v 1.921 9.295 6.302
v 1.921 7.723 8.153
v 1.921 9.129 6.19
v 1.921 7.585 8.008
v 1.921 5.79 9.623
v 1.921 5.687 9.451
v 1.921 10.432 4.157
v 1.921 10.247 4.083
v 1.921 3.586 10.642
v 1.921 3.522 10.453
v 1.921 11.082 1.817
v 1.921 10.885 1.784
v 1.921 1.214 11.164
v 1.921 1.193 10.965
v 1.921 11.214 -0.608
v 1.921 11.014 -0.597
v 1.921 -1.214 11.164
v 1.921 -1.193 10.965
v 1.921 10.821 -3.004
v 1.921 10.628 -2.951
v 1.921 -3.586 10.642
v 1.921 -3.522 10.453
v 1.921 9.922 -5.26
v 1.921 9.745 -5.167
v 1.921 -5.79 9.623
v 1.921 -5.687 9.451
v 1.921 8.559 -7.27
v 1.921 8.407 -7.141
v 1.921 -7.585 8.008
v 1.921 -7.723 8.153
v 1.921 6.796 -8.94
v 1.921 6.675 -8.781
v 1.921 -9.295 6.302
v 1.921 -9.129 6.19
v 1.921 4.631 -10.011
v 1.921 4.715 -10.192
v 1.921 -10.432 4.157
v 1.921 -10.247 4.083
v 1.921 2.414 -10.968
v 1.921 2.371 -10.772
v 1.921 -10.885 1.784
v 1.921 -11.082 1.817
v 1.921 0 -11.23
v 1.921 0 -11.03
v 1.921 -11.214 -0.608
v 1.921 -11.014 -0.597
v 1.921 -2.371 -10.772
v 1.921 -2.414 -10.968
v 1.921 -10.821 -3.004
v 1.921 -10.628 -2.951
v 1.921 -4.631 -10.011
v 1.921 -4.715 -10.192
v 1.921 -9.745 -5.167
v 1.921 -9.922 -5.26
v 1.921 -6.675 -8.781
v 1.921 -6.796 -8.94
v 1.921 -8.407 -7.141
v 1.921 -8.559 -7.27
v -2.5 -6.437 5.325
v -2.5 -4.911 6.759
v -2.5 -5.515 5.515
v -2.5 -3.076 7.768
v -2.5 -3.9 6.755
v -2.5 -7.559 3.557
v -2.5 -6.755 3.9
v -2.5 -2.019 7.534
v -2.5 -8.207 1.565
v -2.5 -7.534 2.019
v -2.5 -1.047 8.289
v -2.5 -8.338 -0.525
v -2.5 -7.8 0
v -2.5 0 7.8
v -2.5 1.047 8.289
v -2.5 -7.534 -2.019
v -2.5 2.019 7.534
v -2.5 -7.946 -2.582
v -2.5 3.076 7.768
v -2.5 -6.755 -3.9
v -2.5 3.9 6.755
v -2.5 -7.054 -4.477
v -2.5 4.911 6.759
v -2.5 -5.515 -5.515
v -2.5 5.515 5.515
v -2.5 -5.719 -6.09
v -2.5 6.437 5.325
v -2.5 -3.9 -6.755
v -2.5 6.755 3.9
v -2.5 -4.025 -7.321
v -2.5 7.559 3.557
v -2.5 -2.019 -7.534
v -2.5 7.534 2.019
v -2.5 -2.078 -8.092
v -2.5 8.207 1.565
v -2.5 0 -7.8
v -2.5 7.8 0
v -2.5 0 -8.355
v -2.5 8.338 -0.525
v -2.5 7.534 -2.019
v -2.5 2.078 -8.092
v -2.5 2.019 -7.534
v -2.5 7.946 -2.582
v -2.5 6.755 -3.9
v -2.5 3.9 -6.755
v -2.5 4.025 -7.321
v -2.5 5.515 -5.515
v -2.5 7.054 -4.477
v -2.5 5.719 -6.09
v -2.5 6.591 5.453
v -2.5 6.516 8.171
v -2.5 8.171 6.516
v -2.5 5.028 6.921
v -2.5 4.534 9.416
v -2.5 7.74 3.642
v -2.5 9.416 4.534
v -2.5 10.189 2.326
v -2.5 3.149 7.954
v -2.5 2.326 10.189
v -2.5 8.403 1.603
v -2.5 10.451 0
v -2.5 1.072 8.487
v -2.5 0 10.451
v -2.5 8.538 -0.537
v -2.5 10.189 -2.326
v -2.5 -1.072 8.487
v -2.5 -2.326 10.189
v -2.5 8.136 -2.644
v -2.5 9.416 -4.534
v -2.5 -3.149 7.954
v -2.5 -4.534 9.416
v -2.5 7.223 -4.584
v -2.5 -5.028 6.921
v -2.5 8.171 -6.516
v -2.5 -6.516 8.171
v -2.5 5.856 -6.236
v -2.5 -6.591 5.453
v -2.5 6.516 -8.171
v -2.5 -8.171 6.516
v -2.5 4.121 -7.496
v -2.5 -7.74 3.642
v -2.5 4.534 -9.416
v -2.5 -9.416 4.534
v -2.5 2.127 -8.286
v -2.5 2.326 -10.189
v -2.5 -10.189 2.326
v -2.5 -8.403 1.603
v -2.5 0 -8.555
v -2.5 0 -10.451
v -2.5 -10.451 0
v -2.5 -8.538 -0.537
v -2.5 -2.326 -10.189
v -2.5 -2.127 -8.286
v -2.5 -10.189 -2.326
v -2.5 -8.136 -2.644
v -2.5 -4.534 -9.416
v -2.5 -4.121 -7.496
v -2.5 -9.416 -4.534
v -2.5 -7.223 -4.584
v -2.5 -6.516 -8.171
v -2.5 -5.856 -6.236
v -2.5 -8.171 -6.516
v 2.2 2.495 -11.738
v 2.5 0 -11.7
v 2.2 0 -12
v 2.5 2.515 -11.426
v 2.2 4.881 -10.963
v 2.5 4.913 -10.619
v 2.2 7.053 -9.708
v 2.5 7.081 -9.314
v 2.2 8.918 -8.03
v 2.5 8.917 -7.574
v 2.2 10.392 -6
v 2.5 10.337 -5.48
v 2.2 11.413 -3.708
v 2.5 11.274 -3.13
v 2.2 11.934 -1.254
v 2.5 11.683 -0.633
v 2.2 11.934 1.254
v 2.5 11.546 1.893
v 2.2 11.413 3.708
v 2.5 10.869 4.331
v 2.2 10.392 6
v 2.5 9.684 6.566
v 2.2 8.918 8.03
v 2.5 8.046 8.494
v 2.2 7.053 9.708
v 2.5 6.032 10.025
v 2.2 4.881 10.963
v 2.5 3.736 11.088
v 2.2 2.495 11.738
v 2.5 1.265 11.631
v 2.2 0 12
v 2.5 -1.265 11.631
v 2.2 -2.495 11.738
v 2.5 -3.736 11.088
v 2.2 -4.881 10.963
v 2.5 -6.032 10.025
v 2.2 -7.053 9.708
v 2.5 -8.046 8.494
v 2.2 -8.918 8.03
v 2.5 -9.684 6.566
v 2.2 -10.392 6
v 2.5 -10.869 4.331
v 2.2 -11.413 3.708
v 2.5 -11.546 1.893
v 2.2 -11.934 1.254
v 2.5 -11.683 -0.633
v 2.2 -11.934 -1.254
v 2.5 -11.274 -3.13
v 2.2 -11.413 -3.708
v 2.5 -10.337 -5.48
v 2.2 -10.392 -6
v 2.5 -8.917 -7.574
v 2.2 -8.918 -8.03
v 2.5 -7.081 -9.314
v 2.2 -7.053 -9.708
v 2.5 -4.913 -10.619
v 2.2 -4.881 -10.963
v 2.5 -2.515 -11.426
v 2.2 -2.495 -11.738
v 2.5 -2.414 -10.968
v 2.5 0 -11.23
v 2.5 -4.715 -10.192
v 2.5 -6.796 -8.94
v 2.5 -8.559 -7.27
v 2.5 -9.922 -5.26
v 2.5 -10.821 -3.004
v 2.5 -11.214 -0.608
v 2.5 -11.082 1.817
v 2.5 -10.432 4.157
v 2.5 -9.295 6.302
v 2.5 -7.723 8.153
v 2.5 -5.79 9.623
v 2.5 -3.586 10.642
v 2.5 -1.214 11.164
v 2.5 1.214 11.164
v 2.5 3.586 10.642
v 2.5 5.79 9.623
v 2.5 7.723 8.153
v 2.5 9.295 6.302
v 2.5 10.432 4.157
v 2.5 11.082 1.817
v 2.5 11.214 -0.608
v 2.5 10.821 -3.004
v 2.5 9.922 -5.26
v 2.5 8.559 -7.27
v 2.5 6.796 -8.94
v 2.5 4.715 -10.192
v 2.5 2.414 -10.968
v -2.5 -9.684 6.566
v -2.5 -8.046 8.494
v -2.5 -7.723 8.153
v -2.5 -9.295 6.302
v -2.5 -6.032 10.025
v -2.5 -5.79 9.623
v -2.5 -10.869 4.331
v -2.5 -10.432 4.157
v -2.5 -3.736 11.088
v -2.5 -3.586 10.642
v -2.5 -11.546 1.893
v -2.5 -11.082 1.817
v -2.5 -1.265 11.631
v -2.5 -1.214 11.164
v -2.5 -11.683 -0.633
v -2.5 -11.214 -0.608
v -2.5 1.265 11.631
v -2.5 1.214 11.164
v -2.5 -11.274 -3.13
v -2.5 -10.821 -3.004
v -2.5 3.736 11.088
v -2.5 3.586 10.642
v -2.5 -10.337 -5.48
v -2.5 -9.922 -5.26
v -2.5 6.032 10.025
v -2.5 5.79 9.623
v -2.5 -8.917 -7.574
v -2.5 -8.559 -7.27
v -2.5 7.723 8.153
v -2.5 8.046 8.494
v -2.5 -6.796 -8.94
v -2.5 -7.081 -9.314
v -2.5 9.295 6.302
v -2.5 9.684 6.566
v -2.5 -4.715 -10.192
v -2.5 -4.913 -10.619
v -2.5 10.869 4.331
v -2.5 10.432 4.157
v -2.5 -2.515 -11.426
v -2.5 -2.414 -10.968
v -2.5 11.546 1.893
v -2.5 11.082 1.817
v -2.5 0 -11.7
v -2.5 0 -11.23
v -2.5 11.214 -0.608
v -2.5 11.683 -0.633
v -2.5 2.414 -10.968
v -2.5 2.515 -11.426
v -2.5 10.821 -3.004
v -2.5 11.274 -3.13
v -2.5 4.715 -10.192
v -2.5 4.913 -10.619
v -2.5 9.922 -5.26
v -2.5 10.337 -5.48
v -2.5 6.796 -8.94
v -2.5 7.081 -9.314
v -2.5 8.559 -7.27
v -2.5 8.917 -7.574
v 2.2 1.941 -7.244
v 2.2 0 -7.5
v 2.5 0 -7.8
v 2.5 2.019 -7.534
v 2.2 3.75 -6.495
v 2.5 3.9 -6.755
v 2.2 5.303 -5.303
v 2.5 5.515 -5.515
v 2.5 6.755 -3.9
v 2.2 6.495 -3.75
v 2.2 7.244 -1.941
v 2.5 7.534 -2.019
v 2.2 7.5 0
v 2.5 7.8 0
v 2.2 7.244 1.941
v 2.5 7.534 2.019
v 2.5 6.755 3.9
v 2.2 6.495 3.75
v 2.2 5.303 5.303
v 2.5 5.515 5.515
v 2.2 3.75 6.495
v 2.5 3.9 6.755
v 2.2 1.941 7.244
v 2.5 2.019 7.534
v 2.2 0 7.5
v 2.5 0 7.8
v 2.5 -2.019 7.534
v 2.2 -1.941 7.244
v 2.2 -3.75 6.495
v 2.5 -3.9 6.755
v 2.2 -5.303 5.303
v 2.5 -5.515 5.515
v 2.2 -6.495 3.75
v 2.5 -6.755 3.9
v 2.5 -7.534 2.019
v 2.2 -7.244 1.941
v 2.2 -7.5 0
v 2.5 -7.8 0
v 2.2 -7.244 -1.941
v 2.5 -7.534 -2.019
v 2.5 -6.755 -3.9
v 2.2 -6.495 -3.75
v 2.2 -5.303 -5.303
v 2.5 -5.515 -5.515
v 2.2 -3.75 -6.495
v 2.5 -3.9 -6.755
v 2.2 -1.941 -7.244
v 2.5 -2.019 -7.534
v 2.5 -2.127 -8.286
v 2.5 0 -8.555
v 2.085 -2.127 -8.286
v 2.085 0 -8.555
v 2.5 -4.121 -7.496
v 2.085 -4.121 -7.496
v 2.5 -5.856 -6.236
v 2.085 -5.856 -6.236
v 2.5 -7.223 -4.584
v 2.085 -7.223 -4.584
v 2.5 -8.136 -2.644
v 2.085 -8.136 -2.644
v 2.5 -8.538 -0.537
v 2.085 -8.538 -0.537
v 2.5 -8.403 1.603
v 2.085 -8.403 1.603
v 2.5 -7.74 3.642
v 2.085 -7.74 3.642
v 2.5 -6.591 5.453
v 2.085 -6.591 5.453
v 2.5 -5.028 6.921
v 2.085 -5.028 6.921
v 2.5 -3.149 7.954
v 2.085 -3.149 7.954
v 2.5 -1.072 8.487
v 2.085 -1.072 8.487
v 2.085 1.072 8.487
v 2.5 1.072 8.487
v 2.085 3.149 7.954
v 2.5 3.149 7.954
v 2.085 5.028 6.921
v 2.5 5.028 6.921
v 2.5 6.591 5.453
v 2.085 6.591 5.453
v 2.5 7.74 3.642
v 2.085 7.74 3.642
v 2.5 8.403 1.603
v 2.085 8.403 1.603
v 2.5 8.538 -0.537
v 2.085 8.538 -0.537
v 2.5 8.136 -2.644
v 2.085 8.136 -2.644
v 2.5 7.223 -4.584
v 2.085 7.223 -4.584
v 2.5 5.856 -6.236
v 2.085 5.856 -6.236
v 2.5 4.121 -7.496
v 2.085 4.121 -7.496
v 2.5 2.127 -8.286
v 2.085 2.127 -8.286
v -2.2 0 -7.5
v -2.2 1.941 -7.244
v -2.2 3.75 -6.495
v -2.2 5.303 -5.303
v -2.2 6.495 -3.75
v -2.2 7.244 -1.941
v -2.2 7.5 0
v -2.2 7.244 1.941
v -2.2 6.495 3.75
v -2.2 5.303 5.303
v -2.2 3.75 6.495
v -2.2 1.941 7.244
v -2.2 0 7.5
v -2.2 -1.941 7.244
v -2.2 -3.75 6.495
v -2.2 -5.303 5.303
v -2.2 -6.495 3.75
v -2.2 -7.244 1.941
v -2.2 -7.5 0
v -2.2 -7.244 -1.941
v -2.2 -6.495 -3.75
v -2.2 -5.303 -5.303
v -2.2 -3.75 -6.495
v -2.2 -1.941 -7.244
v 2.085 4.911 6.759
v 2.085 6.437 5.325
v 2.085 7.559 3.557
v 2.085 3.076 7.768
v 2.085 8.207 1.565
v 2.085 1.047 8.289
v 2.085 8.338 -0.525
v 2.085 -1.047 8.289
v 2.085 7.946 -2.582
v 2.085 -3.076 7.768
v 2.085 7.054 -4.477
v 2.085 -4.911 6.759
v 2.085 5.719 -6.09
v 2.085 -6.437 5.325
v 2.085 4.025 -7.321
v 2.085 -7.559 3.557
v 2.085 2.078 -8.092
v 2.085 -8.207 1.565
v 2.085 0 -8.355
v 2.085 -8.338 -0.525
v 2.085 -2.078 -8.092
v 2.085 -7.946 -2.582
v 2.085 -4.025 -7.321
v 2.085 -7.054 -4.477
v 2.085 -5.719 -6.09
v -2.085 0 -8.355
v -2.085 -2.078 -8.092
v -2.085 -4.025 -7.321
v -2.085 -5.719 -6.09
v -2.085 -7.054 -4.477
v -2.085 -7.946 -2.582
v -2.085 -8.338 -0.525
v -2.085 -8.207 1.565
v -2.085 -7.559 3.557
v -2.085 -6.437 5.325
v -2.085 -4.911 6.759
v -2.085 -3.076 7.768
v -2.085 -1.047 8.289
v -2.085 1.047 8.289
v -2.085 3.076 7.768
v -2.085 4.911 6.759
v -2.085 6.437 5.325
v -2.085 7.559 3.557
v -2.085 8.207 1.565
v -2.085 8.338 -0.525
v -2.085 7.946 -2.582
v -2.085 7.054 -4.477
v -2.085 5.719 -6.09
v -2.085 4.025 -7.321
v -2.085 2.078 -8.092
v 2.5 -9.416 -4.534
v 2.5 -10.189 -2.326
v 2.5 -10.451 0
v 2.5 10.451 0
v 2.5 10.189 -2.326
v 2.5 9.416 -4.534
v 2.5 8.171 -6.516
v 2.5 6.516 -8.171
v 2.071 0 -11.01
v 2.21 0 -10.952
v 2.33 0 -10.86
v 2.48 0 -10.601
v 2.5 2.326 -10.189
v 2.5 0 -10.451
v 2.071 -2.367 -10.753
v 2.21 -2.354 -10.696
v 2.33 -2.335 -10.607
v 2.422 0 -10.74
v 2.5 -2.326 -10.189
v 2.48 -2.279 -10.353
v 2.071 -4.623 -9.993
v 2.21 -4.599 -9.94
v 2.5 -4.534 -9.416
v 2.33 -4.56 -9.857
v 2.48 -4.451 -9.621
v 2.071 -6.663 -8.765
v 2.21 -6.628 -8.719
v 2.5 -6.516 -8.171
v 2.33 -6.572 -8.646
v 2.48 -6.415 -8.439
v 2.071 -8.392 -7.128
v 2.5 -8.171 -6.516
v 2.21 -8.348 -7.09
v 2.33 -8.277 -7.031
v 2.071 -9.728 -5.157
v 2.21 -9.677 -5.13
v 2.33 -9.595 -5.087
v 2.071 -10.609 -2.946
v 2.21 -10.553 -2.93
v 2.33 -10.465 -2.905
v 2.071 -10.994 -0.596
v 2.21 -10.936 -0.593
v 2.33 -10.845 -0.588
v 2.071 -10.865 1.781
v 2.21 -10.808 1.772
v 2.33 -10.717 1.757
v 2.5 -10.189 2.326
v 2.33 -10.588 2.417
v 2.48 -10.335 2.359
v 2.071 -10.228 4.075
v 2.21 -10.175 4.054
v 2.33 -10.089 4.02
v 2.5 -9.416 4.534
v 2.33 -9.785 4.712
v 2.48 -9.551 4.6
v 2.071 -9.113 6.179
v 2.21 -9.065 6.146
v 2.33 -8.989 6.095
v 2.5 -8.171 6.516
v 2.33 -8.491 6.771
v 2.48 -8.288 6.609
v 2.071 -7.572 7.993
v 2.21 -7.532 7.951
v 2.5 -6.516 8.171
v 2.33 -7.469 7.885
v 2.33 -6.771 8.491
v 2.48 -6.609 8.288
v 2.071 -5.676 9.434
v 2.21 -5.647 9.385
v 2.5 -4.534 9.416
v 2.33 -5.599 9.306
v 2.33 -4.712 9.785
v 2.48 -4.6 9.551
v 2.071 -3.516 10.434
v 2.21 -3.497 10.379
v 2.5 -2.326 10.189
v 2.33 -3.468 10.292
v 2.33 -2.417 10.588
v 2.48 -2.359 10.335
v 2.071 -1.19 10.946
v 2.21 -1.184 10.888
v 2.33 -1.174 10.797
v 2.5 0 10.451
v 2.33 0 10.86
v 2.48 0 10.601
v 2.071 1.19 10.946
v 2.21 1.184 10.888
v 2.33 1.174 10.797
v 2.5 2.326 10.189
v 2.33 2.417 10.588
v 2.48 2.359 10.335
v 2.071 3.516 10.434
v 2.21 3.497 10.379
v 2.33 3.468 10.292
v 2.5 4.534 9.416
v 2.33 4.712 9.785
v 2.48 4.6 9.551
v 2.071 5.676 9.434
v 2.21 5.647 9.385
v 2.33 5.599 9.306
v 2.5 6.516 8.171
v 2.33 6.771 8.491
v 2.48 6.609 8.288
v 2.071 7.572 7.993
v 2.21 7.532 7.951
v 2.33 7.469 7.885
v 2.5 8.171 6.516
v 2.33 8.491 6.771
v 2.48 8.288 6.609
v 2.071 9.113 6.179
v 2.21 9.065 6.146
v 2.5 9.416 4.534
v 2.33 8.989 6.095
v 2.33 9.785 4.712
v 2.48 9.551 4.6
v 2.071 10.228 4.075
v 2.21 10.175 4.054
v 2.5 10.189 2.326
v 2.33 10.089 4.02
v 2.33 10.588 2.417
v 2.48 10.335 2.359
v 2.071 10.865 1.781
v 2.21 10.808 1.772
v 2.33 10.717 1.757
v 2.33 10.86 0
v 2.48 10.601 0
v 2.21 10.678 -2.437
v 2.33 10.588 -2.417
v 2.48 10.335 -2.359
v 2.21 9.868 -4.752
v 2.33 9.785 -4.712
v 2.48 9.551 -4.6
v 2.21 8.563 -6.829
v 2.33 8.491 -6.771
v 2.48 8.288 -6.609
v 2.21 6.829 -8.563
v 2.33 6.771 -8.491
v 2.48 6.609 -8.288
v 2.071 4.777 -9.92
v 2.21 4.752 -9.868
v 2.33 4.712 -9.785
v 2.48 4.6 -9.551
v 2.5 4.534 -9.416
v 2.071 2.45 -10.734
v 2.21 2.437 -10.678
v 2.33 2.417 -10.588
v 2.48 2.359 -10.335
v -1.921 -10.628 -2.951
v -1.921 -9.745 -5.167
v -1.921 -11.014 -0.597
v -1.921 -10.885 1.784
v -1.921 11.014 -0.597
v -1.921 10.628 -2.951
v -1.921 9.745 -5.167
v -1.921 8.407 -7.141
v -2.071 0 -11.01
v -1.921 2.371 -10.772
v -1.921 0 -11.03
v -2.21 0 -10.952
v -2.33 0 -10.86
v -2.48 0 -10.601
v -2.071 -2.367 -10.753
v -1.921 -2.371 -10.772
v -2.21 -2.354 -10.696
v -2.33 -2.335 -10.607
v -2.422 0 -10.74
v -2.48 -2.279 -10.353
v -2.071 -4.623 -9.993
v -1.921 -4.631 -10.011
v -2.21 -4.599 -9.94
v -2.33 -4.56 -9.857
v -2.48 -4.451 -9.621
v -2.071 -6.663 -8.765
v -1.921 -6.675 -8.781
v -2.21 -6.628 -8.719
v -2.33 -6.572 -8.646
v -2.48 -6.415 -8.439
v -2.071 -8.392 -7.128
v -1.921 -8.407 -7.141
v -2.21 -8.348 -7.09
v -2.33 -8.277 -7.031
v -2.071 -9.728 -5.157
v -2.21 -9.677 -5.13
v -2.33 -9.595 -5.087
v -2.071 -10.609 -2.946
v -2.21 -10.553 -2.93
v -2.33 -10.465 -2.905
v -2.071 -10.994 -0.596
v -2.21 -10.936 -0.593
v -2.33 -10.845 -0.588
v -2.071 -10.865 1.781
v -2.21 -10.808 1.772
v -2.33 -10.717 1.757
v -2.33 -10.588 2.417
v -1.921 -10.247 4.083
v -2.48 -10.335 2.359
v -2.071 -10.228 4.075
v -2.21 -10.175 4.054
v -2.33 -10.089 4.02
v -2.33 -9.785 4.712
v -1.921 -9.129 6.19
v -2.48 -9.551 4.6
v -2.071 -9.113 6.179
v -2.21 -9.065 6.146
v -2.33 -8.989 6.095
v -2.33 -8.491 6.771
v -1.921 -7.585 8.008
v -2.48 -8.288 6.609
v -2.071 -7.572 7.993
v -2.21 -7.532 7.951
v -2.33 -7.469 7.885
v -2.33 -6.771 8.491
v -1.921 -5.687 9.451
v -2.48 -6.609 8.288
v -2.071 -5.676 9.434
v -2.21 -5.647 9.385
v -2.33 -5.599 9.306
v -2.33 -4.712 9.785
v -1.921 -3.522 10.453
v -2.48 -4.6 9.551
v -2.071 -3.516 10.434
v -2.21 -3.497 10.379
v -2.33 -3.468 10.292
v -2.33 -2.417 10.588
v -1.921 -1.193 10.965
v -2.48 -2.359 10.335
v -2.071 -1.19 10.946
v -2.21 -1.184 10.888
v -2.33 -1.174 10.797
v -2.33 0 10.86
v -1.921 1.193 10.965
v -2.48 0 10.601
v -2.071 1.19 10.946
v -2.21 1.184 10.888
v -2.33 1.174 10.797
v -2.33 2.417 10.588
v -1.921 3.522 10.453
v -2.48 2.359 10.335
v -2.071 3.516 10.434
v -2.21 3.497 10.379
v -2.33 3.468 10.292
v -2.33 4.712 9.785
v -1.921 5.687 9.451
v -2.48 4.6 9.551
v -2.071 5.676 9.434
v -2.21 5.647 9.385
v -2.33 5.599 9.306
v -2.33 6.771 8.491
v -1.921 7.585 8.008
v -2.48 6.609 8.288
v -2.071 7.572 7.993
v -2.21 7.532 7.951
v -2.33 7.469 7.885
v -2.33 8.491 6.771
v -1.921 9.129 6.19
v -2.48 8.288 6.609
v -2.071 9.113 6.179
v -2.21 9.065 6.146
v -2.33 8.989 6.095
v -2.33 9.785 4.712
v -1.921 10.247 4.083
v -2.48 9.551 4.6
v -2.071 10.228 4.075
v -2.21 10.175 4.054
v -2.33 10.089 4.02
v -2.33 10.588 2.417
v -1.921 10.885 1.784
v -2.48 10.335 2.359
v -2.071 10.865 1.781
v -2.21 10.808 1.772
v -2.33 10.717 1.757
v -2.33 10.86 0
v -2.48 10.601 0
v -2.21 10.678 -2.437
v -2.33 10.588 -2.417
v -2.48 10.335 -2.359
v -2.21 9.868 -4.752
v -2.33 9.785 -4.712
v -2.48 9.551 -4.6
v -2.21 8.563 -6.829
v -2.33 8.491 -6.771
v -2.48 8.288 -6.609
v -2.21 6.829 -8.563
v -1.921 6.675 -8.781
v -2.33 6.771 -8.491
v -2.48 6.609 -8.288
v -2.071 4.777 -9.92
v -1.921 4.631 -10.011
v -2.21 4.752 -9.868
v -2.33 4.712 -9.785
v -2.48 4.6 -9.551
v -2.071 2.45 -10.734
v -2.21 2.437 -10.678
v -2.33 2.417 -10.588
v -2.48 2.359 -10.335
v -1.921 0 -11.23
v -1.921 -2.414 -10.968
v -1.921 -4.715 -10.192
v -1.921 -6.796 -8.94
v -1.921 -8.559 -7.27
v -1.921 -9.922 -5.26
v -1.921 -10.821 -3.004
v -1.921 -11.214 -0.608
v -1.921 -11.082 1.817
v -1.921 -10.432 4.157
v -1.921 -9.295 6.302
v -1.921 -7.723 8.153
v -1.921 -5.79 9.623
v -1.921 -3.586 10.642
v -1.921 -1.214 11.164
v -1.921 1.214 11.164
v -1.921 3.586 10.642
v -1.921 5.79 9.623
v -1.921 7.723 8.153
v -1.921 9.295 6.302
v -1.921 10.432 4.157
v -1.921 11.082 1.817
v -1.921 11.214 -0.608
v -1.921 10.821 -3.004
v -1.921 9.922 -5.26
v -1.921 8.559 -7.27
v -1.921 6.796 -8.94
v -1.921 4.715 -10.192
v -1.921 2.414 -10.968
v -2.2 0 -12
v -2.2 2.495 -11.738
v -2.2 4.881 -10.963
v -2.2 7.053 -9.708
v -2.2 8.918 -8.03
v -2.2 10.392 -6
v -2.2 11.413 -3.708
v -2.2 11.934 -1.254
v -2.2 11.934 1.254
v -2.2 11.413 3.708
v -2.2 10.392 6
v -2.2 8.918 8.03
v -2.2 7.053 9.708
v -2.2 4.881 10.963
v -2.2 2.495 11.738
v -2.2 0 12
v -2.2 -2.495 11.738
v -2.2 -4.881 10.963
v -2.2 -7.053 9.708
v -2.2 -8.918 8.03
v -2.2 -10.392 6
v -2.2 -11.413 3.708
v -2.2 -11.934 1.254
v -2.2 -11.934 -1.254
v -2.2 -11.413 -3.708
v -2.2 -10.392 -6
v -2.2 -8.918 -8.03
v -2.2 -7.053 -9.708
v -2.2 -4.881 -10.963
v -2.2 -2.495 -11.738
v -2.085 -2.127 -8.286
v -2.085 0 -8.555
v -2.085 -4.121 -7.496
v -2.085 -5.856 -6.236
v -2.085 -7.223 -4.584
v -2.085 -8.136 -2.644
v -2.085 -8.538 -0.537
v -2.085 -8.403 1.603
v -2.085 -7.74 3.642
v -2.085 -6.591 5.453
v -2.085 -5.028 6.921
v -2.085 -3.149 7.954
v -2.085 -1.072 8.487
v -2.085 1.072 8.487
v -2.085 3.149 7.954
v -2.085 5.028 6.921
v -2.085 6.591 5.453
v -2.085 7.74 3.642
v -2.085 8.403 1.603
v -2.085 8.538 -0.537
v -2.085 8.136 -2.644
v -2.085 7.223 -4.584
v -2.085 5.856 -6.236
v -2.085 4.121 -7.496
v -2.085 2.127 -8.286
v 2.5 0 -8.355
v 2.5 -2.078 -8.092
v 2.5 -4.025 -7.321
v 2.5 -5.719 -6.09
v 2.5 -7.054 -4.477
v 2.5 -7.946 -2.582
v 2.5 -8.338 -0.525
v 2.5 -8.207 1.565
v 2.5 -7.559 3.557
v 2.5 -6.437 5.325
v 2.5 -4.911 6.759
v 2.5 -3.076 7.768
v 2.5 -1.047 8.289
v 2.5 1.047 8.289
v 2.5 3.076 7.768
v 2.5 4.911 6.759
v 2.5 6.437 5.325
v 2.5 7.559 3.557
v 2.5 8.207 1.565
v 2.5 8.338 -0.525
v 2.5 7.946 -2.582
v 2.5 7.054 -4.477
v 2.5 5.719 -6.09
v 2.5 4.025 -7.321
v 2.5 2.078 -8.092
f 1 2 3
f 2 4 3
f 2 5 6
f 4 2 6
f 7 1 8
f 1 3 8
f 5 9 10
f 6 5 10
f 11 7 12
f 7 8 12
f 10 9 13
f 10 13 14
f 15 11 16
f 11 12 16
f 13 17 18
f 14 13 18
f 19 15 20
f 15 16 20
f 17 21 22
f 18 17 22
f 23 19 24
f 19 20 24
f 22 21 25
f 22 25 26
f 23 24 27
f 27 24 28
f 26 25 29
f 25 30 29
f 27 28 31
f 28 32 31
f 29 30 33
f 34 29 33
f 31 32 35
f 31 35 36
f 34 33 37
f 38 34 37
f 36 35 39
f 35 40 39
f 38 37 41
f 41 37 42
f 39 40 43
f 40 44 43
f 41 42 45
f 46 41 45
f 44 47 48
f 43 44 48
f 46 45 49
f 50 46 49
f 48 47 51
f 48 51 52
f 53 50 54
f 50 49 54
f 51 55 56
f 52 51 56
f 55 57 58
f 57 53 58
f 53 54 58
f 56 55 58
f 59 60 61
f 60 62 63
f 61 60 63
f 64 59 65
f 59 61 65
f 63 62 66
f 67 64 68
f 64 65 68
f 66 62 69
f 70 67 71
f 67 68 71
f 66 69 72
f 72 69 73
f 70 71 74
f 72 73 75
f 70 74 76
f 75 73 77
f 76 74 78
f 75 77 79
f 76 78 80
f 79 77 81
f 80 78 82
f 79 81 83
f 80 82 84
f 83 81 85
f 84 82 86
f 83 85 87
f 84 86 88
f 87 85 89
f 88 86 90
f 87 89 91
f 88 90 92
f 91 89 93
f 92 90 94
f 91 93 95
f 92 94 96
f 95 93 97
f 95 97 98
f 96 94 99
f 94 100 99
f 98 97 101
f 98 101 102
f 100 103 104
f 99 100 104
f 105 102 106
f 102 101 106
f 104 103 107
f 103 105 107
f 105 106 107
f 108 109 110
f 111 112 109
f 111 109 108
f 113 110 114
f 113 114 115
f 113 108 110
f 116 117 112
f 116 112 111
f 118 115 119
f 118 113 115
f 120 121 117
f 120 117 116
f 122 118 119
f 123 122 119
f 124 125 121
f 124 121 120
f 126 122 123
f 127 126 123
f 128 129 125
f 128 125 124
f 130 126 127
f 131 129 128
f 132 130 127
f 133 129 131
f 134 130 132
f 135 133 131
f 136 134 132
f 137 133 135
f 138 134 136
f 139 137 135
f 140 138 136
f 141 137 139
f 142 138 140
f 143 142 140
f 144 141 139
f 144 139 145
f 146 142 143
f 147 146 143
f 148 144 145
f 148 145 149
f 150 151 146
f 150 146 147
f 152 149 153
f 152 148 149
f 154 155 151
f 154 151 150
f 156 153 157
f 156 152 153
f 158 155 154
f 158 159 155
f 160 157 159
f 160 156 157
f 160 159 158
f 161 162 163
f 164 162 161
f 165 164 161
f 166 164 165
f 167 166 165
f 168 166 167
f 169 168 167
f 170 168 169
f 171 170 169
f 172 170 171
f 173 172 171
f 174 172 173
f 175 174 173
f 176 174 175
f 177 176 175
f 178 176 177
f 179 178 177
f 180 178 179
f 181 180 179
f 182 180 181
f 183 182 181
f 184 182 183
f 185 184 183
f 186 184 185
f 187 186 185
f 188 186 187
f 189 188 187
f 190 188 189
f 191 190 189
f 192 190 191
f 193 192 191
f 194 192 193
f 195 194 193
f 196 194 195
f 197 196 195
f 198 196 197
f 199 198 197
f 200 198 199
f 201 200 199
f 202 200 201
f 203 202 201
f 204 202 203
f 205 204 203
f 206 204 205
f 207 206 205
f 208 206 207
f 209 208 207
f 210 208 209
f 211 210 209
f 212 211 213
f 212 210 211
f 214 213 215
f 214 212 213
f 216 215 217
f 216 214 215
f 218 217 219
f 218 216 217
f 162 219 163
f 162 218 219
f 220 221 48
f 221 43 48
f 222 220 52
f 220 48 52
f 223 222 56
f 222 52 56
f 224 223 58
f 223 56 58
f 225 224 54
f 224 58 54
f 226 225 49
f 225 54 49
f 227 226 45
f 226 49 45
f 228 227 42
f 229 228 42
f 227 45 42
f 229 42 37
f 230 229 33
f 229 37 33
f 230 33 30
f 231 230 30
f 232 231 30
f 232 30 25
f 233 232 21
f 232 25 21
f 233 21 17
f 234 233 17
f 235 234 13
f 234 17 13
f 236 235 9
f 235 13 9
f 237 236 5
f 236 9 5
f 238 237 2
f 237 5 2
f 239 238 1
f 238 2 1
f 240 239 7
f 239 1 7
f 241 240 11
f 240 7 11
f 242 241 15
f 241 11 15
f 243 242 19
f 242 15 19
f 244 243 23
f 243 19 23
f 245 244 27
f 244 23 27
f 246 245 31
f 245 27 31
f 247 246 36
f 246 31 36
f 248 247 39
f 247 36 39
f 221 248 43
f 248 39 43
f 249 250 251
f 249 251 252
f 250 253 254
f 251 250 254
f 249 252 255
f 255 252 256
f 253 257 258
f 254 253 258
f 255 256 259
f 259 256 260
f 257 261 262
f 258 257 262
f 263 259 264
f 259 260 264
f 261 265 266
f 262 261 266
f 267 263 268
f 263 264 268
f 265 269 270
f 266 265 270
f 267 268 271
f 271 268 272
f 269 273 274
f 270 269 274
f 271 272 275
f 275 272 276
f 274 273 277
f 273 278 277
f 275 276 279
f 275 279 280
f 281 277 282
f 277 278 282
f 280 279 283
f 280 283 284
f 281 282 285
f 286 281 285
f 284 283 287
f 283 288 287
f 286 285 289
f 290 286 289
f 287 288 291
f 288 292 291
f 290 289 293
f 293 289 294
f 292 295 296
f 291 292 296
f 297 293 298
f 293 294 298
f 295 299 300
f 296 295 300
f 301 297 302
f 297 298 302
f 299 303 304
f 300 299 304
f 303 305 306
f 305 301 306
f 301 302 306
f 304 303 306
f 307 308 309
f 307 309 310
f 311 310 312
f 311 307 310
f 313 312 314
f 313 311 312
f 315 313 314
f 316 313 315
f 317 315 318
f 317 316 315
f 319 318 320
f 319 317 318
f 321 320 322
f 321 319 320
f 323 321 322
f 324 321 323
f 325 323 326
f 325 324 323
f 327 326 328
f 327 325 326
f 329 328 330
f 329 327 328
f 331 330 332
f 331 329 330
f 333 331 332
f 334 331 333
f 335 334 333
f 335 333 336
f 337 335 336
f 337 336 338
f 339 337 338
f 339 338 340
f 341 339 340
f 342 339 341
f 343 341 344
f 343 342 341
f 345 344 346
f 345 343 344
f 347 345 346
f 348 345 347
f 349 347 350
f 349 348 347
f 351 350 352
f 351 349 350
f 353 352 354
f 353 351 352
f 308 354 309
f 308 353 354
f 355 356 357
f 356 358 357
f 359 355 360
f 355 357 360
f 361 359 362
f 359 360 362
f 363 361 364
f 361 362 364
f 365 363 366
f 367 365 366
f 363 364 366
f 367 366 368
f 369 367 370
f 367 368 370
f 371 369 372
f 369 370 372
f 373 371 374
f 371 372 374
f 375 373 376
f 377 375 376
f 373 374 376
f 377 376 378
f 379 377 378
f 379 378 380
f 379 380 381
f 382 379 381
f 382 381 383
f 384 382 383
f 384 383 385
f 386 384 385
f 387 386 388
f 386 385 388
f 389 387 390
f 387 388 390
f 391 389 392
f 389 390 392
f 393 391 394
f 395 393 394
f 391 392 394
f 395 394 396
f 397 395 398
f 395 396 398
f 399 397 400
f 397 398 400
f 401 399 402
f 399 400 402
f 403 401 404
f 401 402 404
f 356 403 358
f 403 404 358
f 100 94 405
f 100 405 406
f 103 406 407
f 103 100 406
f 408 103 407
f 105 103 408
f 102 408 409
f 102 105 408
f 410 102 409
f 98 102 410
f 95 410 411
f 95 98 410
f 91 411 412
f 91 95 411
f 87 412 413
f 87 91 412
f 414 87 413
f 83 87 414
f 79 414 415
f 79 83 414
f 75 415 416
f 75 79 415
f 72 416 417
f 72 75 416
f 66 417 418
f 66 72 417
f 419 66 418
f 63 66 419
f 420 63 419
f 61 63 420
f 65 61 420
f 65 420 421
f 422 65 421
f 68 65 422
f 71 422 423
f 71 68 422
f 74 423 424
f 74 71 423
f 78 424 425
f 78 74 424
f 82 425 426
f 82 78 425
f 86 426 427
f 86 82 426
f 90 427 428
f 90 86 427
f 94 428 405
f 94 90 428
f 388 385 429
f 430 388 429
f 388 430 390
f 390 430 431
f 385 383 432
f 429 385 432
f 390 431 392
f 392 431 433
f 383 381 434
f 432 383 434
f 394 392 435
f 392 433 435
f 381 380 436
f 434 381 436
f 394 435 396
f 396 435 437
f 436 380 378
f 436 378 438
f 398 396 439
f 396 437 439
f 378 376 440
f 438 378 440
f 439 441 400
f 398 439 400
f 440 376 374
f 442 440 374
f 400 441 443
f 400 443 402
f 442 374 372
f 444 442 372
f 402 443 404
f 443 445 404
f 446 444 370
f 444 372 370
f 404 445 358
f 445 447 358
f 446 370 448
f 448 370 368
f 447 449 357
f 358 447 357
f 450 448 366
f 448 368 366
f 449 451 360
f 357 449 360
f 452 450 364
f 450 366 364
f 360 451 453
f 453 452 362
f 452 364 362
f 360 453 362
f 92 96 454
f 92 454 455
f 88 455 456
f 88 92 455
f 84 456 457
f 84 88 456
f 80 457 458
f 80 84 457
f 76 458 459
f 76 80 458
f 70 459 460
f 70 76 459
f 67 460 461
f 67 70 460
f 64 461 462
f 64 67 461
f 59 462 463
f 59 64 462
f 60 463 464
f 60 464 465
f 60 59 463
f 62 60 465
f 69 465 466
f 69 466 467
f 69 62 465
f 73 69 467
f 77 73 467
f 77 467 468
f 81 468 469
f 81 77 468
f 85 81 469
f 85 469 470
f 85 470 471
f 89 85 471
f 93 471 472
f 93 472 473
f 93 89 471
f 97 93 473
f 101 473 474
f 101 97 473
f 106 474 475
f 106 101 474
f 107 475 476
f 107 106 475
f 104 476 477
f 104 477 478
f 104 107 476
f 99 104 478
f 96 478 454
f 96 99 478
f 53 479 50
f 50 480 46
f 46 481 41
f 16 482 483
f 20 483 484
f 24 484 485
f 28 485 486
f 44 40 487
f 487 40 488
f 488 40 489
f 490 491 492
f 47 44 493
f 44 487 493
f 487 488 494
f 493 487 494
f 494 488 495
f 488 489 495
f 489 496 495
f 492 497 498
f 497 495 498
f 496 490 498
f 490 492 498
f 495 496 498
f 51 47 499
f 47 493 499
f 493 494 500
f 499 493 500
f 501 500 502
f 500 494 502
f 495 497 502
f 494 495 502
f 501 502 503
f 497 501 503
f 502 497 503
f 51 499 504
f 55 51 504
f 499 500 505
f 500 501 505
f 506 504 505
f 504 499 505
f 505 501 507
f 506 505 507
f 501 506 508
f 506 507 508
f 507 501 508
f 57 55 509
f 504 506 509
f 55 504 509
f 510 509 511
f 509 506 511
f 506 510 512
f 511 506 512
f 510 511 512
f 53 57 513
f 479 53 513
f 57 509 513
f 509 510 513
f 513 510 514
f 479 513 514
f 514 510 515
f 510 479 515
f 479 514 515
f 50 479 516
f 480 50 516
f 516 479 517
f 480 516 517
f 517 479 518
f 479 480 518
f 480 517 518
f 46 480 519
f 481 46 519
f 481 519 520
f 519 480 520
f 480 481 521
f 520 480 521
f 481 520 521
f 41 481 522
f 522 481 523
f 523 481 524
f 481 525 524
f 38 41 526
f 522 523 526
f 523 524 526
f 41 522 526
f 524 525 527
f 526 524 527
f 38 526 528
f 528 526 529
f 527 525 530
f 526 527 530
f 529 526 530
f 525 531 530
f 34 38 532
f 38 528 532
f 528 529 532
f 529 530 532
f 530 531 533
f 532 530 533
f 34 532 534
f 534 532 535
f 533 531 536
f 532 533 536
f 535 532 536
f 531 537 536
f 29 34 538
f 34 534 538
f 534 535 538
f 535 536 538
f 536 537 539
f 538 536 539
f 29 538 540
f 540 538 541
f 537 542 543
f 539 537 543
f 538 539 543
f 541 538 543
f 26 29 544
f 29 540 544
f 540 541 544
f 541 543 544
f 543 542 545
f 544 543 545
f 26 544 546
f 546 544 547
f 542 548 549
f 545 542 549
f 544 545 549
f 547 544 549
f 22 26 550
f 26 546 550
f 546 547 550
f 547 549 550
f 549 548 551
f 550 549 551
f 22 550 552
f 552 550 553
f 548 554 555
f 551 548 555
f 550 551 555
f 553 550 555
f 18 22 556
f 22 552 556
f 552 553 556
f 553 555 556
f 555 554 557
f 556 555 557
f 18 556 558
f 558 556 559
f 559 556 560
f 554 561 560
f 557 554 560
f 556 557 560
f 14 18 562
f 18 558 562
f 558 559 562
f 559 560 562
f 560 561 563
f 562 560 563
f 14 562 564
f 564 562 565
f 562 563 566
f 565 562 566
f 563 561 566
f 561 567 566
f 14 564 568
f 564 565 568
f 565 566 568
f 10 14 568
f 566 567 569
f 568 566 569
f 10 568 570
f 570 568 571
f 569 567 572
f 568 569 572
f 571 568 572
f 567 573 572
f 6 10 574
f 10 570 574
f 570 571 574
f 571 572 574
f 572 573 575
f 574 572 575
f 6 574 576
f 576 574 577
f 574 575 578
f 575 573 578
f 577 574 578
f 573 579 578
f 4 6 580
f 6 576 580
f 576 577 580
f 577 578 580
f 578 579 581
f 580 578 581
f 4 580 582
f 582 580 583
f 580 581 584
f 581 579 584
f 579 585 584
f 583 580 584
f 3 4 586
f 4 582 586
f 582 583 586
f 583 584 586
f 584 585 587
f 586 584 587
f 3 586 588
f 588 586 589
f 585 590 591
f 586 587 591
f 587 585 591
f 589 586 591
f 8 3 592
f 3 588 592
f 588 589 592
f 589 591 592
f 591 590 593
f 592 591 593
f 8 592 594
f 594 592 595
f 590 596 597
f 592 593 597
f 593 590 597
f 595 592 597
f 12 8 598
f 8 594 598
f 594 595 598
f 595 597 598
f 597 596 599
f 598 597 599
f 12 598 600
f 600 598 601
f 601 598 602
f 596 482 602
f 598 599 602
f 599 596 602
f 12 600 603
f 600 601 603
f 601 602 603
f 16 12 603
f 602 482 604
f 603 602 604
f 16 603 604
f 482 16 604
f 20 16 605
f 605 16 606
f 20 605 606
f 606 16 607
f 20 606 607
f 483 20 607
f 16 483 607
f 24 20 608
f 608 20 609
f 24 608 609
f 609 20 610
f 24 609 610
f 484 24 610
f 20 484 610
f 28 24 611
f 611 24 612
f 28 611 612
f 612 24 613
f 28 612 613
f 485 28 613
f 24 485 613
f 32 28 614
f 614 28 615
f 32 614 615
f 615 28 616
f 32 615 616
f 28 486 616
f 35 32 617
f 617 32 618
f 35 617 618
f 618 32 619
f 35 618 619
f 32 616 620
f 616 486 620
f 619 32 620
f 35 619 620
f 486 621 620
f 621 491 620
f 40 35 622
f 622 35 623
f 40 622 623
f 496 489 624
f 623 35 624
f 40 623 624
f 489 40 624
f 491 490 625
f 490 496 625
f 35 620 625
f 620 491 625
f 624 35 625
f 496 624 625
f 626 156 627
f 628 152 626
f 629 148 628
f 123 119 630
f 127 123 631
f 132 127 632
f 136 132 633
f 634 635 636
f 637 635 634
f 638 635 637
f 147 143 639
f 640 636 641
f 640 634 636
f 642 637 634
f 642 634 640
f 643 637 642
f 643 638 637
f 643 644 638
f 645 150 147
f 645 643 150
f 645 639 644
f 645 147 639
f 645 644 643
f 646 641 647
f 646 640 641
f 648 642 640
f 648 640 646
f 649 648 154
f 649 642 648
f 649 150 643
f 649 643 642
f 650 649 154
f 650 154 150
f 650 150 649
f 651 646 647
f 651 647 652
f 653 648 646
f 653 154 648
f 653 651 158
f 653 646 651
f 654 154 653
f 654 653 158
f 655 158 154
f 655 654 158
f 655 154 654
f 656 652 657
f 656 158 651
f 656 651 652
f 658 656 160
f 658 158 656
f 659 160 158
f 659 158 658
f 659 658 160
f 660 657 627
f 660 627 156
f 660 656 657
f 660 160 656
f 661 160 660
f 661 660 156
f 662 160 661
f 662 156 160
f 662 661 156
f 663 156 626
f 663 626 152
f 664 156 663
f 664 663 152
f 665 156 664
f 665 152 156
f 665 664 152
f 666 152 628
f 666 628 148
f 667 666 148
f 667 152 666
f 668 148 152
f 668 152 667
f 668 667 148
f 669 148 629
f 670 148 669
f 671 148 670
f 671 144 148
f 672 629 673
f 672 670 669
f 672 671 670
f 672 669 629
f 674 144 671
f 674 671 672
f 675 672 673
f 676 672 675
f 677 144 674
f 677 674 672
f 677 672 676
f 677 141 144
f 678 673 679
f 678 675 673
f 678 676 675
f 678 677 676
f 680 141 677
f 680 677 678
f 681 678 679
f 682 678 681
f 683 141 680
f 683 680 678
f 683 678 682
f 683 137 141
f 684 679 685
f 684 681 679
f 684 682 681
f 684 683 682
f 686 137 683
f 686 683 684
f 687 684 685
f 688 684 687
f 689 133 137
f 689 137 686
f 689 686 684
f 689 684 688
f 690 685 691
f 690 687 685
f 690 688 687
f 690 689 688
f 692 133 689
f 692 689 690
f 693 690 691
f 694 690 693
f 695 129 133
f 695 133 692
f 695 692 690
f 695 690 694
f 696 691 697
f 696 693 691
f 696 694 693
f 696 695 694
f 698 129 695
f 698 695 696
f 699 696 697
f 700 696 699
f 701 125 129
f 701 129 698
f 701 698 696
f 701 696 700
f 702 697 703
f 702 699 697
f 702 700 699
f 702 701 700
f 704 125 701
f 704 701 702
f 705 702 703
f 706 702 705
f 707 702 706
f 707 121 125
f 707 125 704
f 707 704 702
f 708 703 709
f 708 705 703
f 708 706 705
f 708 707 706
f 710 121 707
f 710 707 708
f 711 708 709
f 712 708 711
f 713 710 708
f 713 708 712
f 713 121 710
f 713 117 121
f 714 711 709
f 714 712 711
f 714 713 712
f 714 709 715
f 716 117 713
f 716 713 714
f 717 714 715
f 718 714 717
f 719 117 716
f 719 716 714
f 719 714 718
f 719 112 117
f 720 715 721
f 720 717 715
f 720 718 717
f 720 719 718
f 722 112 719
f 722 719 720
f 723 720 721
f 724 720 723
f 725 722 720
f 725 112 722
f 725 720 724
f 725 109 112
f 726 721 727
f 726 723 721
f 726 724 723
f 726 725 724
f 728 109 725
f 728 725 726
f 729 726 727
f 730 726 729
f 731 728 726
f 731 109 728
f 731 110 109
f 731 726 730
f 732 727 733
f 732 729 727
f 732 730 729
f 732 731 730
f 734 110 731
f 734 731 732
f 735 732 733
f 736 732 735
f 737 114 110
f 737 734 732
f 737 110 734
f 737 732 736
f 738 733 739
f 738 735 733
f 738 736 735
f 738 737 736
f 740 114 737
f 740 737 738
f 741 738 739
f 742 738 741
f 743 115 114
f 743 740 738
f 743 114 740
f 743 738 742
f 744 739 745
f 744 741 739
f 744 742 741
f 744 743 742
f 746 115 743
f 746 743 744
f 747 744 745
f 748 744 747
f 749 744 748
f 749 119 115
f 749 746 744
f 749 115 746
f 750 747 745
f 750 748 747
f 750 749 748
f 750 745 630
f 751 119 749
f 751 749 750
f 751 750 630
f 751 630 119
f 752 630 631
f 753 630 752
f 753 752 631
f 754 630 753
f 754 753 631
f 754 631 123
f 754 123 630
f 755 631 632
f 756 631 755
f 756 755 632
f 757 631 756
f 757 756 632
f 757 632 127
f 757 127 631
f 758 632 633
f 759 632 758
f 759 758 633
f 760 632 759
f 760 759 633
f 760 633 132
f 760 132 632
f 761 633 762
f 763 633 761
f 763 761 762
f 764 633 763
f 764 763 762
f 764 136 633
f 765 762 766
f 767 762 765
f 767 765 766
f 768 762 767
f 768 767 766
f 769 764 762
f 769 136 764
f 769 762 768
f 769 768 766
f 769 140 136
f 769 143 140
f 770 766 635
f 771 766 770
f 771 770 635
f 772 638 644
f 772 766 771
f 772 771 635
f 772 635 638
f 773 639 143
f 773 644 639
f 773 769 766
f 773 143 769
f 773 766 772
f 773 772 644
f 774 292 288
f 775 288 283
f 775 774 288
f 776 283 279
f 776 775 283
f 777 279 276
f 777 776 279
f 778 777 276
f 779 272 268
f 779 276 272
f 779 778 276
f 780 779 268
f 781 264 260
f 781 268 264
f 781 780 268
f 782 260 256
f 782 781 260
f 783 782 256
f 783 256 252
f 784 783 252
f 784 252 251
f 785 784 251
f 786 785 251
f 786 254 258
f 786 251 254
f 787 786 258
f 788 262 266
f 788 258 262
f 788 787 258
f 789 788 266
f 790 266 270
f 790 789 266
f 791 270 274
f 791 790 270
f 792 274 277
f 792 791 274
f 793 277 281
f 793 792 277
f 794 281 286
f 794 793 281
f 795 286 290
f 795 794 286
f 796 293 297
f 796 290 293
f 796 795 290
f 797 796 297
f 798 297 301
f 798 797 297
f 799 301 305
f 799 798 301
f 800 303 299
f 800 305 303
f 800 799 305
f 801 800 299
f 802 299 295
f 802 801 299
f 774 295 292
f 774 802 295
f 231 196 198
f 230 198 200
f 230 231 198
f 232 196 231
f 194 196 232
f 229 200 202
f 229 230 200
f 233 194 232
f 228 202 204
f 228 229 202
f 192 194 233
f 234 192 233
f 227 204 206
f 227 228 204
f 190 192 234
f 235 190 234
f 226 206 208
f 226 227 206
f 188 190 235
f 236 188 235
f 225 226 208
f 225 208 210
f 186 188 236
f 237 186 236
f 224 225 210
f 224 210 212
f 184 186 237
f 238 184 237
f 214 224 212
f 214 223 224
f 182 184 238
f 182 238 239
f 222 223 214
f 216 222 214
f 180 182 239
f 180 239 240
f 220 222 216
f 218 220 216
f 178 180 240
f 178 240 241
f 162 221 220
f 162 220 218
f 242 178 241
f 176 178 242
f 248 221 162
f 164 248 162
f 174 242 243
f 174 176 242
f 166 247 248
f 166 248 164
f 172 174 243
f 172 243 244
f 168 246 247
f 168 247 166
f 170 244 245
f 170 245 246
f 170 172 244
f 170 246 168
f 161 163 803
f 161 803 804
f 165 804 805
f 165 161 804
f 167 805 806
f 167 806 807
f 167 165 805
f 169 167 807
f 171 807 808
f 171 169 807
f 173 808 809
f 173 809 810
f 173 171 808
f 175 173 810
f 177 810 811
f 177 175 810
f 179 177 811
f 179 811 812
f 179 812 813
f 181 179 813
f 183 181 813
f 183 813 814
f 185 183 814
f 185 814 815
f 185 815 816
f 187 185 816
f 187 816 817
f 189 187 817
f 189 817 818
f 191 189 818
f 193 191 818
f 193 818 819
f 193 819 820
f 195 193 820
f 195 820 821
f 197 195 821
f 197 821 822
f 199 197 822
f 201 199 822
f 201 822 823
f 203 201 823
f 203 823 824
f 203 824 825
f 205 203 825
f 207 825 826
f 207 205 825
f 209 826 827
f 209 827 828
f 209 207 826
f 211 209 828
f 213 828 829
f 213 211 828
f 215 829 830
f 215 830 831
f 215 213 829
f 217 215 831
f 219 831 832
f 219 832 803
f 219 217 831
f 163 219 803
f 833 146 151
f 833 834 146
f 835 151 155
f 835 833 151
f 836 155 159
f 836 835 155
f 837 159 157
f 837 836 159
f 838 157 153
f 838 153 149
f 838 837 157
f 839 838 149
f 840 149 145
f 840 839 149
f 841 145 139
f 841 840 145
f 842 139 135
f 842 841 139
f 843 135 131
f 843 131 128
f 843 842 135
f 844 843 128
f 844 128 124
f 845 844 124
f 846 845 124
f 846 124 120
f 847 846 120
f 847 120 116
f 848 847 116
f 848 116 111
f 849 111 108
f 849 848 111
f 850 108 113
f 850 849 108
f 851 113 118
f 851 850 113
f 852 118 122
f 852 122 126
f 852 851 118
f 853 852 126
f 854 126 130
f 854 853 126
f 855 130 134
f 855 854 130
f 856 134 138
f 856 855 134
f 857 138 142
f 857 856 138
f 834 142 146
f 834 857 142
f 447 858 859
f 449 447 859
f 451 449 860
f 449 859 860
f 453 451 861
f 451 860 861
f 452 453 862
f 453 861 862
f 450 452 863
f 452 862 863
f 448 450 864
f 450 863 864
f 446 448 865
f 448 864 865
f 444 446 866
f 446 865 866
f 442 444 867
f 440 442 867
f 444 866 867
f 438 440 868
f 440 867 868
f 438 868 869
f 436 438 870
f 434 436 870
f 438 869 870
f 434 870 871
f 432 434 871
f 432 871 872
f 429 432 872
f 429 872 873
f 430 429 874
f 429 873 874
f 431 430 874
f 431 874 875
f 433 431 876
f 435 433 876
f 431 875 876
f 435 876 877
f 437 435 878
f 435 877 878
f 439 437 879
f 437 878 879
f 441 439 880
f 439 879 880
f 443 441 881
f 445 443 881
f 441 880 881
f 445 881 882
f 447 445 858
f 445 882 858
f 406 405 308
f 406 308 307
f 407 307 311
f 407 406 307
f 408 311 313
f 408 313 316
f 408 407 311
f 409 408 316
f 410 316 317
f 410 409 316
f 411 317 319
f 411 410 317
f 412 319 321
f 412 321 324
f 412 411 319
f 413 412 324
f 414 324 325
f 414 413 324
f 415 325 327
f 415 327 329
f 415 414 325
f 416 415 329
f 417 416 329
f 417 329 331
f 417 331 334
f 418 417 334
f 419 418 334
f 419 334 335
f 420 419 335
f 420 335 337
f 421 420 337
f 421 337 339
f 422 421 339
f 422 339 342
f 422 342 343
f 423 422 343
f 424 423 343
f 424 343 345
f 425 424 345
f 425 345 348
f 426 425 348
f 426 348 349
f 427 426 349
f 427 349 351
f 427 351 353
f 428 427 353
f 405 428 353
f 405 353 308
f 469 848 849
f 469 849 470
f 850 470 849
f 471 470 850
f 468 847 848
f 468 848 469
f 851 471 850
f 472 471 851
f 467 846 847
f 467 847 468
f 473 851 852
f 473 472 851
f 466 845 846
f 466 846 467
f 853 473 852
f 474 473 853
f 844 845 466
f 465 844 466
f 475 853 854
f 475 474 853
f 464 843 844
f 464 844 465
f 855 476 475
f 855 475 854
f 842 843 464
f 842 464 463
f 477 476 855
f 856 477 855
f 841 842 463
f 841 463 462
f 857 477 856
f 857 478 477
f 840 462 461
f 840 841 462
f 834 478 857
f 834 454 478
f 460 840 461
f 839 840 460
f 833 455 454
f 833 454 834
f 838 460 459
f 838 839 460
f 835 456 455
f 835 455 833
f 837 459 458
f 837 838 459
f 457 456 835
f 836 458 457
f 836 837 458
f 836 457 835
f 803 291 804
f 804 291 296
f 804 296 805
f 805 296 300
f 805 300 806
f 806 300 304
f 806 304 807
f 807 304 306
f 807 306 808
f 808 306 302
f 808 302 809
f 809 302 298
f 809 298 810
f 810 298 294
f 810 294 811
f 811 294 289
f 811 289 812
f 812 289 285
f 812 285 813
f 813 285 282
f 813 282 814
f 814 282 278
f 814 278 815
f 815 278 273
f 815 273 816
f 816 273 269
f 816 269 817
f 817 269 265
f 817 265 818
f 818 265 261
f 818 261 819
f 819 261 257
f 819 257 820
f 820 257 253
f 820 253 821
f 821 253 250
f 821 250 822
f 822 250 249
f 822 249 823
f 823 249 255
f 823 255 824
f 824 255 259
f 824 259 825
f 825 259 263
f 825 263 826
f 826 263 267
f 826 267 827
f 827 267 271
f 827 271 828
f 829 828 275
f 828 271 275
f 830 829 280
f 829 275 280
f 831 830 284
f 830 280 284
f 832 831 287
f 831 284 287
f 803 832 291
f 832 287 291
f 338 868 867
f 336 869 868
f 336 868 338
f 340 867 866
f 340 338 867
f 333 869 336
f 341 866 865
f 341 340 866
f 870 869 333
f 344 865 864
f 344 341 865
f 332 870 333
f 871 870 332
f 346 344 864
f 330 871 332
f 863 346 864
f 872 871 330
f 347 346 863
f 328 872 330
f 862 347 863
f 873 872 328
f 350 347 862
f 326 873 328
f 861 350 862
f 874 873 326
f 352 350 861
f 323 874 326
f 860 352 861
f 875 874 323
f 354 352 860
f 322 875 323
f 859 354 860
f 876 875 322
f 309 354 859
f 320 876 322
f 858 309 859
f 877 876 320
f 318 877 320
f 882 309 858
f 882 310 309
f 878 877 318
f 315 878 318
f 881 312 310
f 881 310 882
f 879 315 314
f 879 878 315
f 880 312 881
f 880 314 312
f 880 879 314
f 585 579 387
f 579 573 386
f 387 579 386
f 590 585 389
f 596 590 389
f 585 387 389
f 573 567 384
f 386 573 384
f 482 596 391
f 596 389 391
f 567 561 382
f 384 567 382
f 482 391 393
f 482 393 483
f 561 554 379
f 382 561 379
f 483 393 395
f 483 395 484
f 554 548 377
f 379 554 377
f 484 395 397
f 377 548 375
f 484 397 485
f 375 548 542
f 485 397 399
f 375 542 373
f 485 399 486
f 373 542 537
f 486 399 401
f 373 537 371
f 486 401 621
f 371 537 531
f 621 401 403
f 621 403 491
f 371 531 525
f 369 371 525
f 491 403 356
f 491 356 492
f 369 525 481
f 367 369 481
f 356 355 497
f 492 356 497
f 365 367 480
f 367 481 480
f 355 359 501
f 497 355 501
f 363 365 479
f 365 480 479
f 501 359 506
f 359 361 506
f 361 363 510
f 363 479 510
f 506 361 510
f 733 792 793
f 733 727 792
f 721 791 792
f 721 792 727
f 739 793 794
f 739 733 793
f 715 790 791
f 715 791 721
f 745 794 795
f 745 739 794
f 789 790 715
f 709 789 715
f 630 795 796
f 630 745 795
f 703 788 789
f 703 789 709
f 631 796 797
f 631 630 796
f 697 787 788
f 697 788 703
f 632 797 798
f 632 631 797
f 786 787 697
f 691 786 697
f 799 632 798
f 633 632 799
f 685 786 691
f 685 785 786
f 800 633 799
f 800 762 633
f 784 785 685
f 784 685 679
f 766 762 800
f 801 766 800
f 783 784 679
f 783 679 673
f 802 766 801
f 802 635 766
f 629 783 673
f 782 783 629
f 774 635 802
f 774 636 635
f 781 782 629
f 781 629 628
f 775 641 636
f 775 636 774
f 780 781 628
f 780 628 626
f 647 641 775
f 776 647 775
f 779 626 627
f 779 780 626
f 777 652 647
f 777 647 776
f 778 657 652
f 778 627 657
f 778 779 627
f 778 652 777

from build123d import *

# Parameters (mm, degrees)
SKETCH1_R           = 12
SKETCH1_R_2         = 7.5
BOSS_EXTRUDE1_DEPTH = 2.5
CHAMFER1_SIZE       = 0.3


with BuildPart() as part:
    # Sketch1 → Boss-Extrude1 (new, symmetric)
    with BuildSketch(Plane(origin=(0, 0, 0), x_dir=(0, 0, -1), z_dir=(1, 0, 0))):
        Circle(SKETCH1_R)
        Circle(SKETCH1_R_2, mode=Mode.SUBTRACT)
    extrude(amount=BOSS_EXTRUDE1_DEPTH, both=True)

    # Chamfer1
    chamfer1_edges = [part.edges().sort_by_distance(p)[0] for p in [
        (-2.5, 0, 12),
        (2.5, 0, 12),
        (-2.5, 0, 7.5),
        (2.5, 0, 7.5),
    ]]
    chamfer(chamfer1_edges, length=CHAMFER1_SIZE)

    # Sketch2 → Cut-Revolve1 (revolve, cut)
    with BuildSketch(Plane.XY, mode=Mode.PRIVATE) as cut_revolve1_sk:
        with BuildLine():
            Line((2.93973246, 11.230084286), (1.92076619, 11.230084286))
            Line((1.92076619, 11.230084286), (1.92076619, 11.030084286))
            ThreePointArc((1.92076619, 11.030084286), (2.330346345, 10.860430631), (2.5, 10.450850477))
            Line((2.5, 10.450850477), (2.5, 8.554548016))
            Line((2.5, 8.554548016), (2.084848677, 8.554548016))
            Line((2.084848677, 8.554548016), (2.084848677, 8.354548016))
            Line((2.084848677, 8.354548016), (2.93973246, 8.354548016))
            Line((2.93973246, 8.354548016), (2.93973246, 11.230084286))
        make_face()
    cut_revolve1 = revolve(cut_revolve1_sk.sketch.rotate(Axis((3.211719083, 0, 0), (-1, 0, 0)), 90), axis=Axis((3.211719083, 0, 0), (-1, 0, 0)), mode=Mode.SUBTRACT)

    # Mirror1: Cut-Revolve1 across plane
    add(cut_revolve1.mirror(Plane(origin=(0, 0, 0), x_dir=(0, 0, 1), z_dir=(1, 0, 0))), mode=Mode.SUBTRACT)


solid = part.part
